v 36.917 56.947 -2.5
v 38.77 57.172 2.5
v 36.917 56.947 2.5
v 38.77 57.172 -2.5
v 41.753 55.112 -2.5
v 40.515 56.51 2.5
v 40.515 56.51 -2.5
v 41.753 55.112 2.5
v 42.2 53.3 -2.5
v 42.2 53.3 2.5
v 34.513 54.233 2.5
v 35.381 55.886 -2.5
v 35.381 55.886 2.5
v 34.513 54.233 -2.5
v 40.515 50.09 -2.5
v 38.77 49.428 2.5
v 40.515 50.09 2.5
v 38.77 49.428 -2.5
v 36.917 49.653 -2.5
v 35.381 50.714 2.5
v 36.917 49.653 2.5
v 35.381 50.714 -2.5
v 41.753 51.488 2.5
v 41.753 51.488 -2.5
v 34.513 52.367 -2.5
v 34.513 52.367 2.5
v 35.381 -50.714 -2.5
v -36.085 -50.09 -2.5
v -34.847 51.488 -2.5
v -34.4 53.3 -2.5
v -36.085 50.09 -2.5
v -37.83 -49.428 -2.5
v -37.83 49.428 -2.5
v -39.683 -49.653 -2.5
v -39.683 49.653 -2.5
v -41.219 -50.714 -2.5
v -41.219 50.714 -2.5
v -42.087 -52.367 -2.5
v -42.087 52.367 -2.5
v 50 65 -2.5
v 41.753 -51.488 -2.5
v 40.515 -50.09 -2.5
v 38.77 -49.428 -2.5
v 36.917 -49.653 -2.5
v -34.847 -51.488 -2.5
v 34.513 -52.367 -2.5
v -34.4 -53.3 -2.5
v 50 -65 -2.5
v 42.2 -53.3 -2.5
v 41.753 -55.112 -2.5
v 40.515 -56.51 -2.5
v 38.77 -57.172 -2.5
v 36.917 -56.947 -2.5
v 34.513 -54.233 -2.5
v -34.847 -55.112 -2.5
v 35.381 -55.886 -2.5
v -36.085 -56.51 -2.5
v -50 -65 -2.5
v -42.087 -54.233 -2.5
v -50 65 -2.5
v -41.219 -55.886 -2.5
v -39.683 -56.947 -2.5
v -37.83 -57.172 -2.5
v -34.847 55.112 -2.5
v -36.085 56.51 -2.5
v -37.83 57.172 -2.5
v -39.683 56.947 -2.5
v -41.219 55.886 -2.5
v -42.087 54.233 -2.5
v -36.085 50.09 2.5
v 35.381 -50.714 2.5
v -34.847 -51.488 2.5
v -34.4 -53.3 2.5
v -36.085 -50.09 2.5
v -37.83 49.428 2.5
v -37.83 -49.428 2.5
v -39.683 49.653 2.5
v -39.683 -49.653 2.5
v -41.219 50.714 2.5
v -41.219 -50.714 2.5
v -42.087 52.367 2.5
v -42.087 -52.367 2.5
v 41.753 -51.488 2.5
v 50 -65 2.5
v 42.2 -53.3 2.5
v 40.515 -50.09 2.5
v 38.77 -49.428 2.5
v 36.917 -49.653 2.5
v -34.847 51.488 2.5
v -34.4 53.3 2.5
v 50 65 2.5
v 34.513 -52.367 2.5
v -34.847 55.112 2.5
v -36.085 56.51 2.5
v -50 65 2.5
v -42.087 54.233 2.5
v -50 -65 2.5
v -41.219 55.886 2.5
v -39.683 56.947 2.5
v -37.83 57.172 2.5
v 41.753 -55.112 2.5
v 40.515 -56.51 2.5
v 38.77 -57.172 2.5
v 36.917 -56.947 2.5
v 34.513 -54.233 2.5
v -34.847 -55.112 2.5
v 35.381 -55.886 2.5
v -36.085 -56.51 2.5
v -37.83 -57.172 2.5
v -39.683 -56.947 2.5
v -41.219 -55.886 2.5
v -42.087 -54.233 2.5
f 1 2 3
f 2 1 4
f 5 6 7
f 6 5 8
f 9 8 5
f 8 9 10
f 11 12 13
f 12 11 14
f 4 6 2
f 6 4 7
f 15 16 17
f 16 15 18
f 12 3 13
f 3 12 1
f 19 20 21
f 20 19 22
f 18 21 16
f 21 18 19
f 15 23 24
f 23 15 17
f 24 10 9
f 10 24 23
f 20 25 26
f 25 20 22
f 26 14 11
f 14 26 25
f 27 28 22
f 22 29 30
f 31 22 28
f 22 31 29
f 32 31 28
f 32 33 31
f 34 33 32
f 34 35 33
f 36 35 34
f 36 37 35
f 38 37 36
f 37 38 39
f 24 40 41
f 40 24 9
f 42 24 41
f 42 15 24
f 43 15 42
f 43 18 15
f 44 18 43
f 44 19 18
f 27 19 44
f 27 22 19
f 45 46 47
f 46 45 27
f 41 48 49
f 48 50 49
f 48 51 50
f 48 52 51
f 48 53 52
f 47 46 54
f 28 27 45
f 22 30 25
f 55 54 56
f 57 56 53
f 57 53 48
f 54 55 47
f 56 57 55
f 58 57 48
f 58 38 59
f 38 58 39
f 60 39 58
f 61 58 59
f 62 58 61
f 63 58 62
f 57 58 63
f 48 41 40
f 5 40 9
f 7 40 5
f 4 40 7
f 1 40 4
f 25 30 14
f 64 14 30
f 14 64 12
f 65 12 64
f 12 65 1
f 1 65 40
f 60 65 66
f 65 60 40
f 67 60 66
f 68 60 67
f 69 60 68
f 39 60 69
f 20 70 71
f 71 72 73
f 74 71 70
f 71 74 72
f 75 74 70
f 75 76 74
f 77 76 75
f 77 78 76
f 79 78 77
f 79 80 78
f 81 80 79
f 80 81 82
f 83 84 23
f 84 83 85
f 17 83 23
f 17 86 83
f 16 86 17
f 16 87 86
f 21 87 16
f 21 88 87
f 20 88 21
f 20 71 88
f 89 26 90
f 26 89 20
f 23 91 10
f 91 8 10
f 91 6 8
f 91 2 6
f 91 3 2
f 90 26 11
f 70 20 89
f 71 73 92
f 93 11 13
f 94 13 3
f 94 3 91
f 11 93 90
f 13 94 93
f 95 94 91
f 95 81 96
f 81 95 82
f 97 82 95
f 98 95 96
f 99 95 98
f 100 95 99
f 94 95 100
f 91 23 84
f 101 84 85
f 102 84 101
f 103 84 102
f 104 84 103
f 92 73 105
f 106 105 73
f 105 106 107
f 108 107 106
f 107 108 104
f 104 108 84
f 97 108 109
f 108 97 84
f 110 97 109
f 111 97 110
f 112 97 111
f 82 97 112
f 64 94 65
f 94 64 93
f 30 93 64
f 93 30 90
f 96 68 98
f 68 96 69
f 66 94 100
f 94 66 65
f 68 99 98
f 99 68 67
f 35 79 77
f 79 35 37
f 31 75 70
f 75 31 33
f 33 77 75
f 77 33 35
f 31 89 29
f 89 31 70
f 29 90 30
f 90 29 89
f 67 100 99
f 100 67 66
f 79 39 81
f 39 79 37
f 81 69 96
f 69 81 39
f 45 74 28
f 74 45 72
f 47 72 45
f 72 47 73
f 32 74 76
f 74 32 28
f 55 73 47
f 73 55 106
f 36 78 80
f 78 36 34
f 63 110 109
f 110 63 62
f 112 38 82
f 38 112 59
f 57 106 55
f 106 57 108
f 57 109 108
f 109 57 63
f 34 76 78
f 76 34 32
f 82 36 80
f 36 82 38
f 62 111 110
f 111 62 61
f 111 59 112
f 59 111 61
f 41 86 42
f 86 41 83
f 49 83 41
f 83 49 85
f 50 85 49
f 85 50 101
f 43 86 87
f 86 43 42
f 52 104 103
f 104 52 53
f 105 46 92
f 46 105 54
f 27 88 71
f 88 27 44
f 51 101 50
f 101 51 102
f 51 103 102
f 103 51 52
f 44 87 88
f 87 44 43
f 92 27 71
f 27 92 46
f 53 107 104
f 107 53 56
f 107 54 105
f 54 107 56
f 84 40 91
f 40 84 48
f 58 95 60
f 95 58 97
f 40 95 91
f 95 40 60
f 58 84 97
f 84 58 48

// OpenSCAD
// Generated by SolidPython 1.1.3 on 2022-11-23 19:51:19


difference() {
	cube(center = true, size = [100, 130.0000000000, 5]);
	union() {
		translate(v = [38.3000000000, 53.3000000000]) {
			cylinder(center = true, h = 5, r = 3.9000000000);
		}
		translate(v = [-38.3000000000, 53.3000000000]) {
			cylinder(center = true, h = 5, r = 3.9000000000);
		}
		translate(v = [-38.3000000000, -53.3000000000]) {
			cylinder(center = true, h = 5, r = 3.9000000000);
		}
		translate(v = [38.3000000000, -53.3000000000]) {
			cylinder(center = true, h = 5, r = 3.9000000000);
		}
	}
}
/***********************************************
*********      SolidPython code:      **********
************************************************
 
import solid
import pudb
from solid.utils import *
import viewscad
import subprocess
import os
import os.path as osp
import math
r = viewscad.Renderer(width=800, height=800)
def debug(model,f_name,path="/home/ts/code/projects/mfd/designs/debug"):
    solid.scad_render_to_file(model,osp.join(path,f_name)+".scad")
#generate position list of wells using offset from center
wells_pos_from_center_4 = lambda offset: [[-offset,offset],
                                        [offset, offset],
                                        [-offset, -offset],
                                        [offset, -offset]]
#wells_pos_from_center_2 = lambda offset: [[0,offset],
#                                        [0, -offset]]
wells_pos_from_center_2 = lambda offset: [[offset,0],
                                        [-offset,0]]

def wells_top_bottom(radius,height=None, positions = None, dxf = False):
    if positions is None:
        offset = radius+radius/2.0
        positions = wells_pos_from_center_2(offset)
    if dxf or (height is None):
        height = 0
    wells = []
    for position in positions:
        #make circle if making dxf
        if dxf:
            well_shape = solid.circle(r=radius, segments=64)
            well_shape = solid.translate([position[0],position[1]])(well_shape)
        #if stl make cylinder
        else:
            well_shape = solid.cylinder(r=radius, h=height, segments=64, center = True)
            well_shape = solid.translate([position[0],position[1],height/2.0])(well_shape)
        wells.append(well_shape)
    return  union()(*wells)

#place wells in four corners 
def four_corner(radius,height=None, positions = None, dxf = False):
    #if well pos not specified set
    #to equally spaced by half radius
    if positions is None:
        offset = radius+radius/2.0
        positions = wells_pos_from_center_4(offset)
    if dxf or (height is None):
        height = 0
    #make wells at positions with specified radius and height
    wells = []
    for position in positions:
        #make circle if making dxf
        if dxf:
            well_shape = solid.circle(r=radius, segments=64)
            well_shape = solid.translate([position[0],position[1]])(well_shape)
        #if stl make cylinder
        else:
            well_shape = solid.cylinder(r=radius, h=height, segments=64, center = True)
            well_shape = solid.translate([position[0],position[1],height/2.0])(well_shape)
        wells.append(well_shape)
    return  union()(*wells)

#generate channels 
def make_channels(length,width,height=0,num_chans=1,max_chans=None,spacing=None, dxf = False,
                  rotate_channels=False):
    if dxf or (height is None):
        height = 0
    #if channel gap not defined, is equal to
    if spacing is None: spacing = width
    #calculate number of channels if fitting max num within given width
    if not max_chans is None:
        import math
        num_chans = math.floor((max_chans-spacing)/(width+spacing))
    #get total width of channel section  
    total_width = (width*num_chans)+(spacing*(num_chans-1))

    #make template channel
    #if rotate_channels: width, length = length, width
    if dxf:
        channel_t = solid.square([length,width],center = True)
    else:
        channel_t = solid.cube([length,width,height], center = True)

    #if number channels is even, offset the first channel to center its gap
    if num_chans % 2 == 0: centering = -(width/2.0+spacing/2.0)
    else: centering = 0
    #move template channel up to align bottom at z = 0 
    #and offset center if necessary
    if dxf:
        channel_t = solid.translate([0,centering])(channel_t)
    else:
        channel_t = solid.translate([0,centering,height/2.0])(channel_t)

    #if rotate_channels: length,width = width,length
    #start making the channels
    channels = []
    for i in range(num_chans):
        #if i=0 there is no translation
        #if i=1, we make the first channel adjacent to second
        direction = i

        #if i>=1, we add channels alternating left and right
        if i >= 1:
            direction = -(i/2.0)
            if i % 2 == 1: direction = (-direction)+0.5
                
        #make channel at right position and add it to channel list
        translation_coords = [0,direction*(width+spacing)]
        #if rotate_channels: translation_coords = [direction*(width+spacing),0]
        if dxf:
            channel = solid.translate(translation_coords)(channel_t)
        else:
            channel = solid.translate([*translation_coords,0])(channel_t)
        channels.append(channel)
    
    #group all channels as one object
    channels = union()(*channels)
    #compute the x,y,z dimensions in order to pass as arguments 
    #for construction of other parts of device (such as the chambers)
    measurements = {'x':(length/2.0,-length/2.0),
                    'y':(total_width/2.0,-total_width/2.0)}
    if not dxf:
        measurements['z'] = (height,0)
    if rotate_channels:
        channels = solid.rotate(90)(channels)
        measurements['x'],measurements['y']=measurements['y'],measurements['x']
    return channels,measurements

def make_chambers(msrs,height=None,extra=0,len_until=None,width=None, dxf = False):
    #computes x,y,z length
    total = lambda x : abs(x[0]) + abs(x[1])
    
    #if specific height if specified
    #otherwise use same height as channels
    if dxf:
        pass
    elif not height is None:
        msrs['z'] = (height,0)
    else:
        msrs['z'] = (0,0)
        
    #make copy of measurements from channels to modify chamber dimensions 
    #and add length to chambers as specified
    chamber_dims = msrs.copy()
    #calculate length of chamber to reach specified offset
    if not len_until is None:
        chamber_len = len_until-(msrs['x'][0])
    #or add specified length to channel length (if not specified, adds 0)
    else:
        chamber_len = msrs['x'][0]+extra
    #set the chamber length based 
    chamber_dims['x'] = (chamber_len/2.0,-(chamber_len/2.0))
    #compute final dimensions of chamber
    if not width is None:
        chamber_dims['y'] = (width/2.0,-width/2.0)
    chamber_dims = [total(size) for size in chamber_dims.values()]
        
    #calculate chamber translation offset to place adjacent to channels
    chamber_trslt = msrs['x'][0]+(chamber_len/2.0)
    #compute chamber translation coordinates to align with channels
    #x = 1 moves chamber above channels
    #x = -1 moves chamber below channels
    if dxf:
        trslt = lambda x : [x*(chamber_trslt),0]
    else:
        trslt = lambda x : [x*(chamber_trslt),0,msrs['z'][0]/2.0]
    
    #function to make chamber at top or at bottom 
    if dxf:
        move = lambda x : solid.translate(trslt(x))(solid.square(chamber_dims, center = True) )
    else:
        move = lambda x : solid.translate(trslt(x))(solid.cube(chamber_dims,center = True))
    #make top and bottom chambers and return them as grouped
    top = move(1)
    bottom = move(-1)
    #chambers=solid.rotate(90)(solid.union()(top,bottom))
    chambers=(solid.union()(top,bottom))

    return chambers

#create alignment features 
def alignment_features(unit,dims,grid_size, mask_size = None, alignment = "hollow", units_from_center = (2.5,2.5), corner_len=None):
    width = grid_size[0]*dims[0]
    length = grid_size[1]*dims[1]
    if mask_size is None and corner_len is None:
        corner_len = (dims[0] + dims[1]) /2 / 8
    corner = lambda thickness_div : solid.union()( solid.square([corner_len,corner_len/thickness_div],center=False), solid.square([corner_len/thickness_div,corner_len],center=False) )
    
    def make_full(thickness_div):
        thickness = corner_len/thickness_div
        tr = solid.translate([0, 0, 0 ])(solid.rotate(180)(corner(thickness_div)))
        tr = solid.translate([thickness/2,thickness/2,0])(tr)
        bl = solid.translate([0, 0, 0 ])(solid.rotate(0)(corner(thickness_div)))
        bl = solid.translate([-thickness/2,-thickness/2,0])(bl)
        return solid.union()(tr,bl)
    
    def make_hollow(thickness_div):
        thickness = corner_len/(thickness_div/2)
        inner = make_full(thickness_div)
        outer = make_full(thickness_div/2)
        hollow = outer - inner 
        return hollow
    
    center = (width /2 , length/2)
    mask_pos = lambda x,y : (center[0] + x*(float(units_from_center[0])*dims[0]), center[1] + y*(float(units_from_center[1])*dims[1]))
    positions = []
    positions.append(mask_pos(1,0))
    positions.append(mask_pos(0,1))
    positions.append(mask_pos(-1,0))
    positions.append(mask_pos(0,-1))
    make_mask = lambda mtype : make_hollow(8) if mtype == "hollow" else make_full(8)
    masks = [ solid.translate([*position,0])(make_mask(alignment)) for position in positions]
    
    solid.scad_render_to_file(solid.union()(*masks),"./designs/open_chamber/masks.scad")
    #return unit - solid.union()(*masks)
    return solid.union()(*masks,unit)

def create_outline(thickness, array, dims, grid_size,):
    width = grid_size[0]*dims[0] + thickness *2
    length = grid_size[1]*dims[1] + thickness *2
    outer = solid.translate([-thickness, -thickness,0])(solid.square([width, length]))
    return outer-array

def create_wall(wall_thickness, outline_thickness, dims, grid_size, wall_height = 2000, dxf = False):
    inner_width = grid_size[0]*dims[0] + outline_thickness *2
    inner_length = grid_size[1]*dims[1] + outline_thickness *2
    outer_width = inner_width + wall_thickness * 2
    outer_length = inner_length + wall_thickness * 2
    outer_pos_x = -outline_thickness-wall_thickness
    outer_pos_y = -outline_thickness-wall_thickness
    inner_pos_x = -outline_thickness
    inner_pos_y = -outline_thickness
    if dxf:
        inner_wall = solid.translate([inner_pos_x,
                                      inner_pos_y,
                                      0])(solid.square([inner_width, inner_length]))
        outer_wall = solid.translate([outer_pos_x,
                                      outer_pos_y,
                                      0])(solid.square([outer_width, outer_length]))

        return outer_wall-inner_wall
    else:
        inner_wall = solid.translate([inner_pos_x,
                                      inner_pos_y,
                                      0])(solid.cube([inner_width, inner_length,wall_height]))
        outer_wall = solid.translate([outer_pos_x,
                                      outer_pos_y,
                                      0])(solid.cube([outer_width, outer_length,wall_height]))

        return outer_wall-inner_wall, {'wall_height': wall_height,
                                       'wall_thickness': wall_thickness,
                                       'inner_width':inner_width,
                                       'inner_length': inner_length,
                                       'outer_width': outer_width,
                                       'outer_length': outer_length,
                                       'outer_pos_x' : outer_pos_x,
                                       'outer_pos_y' : outer_pos_y,
                                       'inner_pos_x' : inner_pos_x,
                                       'inner_pos_y' : inner_pos_y}

def create_thicker_wall(wall_thickness, outer_wall_offset, wall_dims, dims, grid_size, height_start = .2, height_end=2, dxf = False):
    addon_wall,thicker_wall_dims = create_wall(wall_thickness, outer_wall_offset, dims, grid_size, wall_height=height_end-height_start, dxf = False)
    addon_wall = solid.translate([0,0,height_start])(addon_wall)

    thicker_wall_dims['wall_height'] = height_end
    thicker_wall_dims['wall_thickness'] = wall_dims['wall_thickness'] + wall_thickness
    return addon_wall, thicker_wall_dims
 
def add_lock_to_wall(wall,wall_dims,y_offset = 0,cut_ratio=0.7,L_length=3, gap_ratio=0.05, axis="x",width_ratio=1/2):
    # Makes L shape
    def make_L(max_length,length_thickness,max_width,width_thickness,height,y_offset):
        length = solid.cube([max_length,length_thickness,height])
        width = solid.cube([width_thickness,max_width,height])
        width = solid.translate([max_length-(width_thickness),0,0])(width)
        L = solid.union()(width,length)
        debug(L,"L")
        if axis == "x":
            L = solid.rotate(-90)(L)
            L = solid.translate([0,max_length,0])(L)
        else:
            L = solid.rotate(-180)(L)
            L = solid.translate([max_length,max_width,0])(L)
        return solid.translate([0,0,y_offset])(L)
    
    lock_length = L_length
    lock_width = wall_dims['wall_thickness']*width_ratio
    lock_length_thickness = lock_width/2
    lock_width_thickness = lock_width/2
    L_lock = make_L(lock_length,lock_length_thickness,lock_width,lock_width_thickness, wall_dims['wall_height']-y_offset, y_offset)
    
    margin_space = lock_length - lock_length*(1-gap_ratio)
    key_length = lock_length-margin_space
    key_length_thickness = lock_length_thickness-(margin_space*2)
    key_width = lock_width-(margin_space*2)
    key_width_thickness = lock_width_thickness-(margin_space*2)
    L_key = make_L(key_length,key_length_thickness,key_width,key_width_thickness, wall_dims['wall_height']-y_offset, y_offset)
    L_key = solid.translate([margin_space,margin_space,0])(L_key)
    L = solid.union()(L_lock,L_key)
    debug(L,"L")
    
    #Make cube to be used as negative to split frame in a half
    #Can choose if making left or right negative, specify ratio of split
    def make_negative(right,cut_ratio):
        if axis == "x":
            if right:
                length = wall_dims['outer_length']*(1-cut_ratio)
                pos_x = wall_dims['outer_pos_x']+(wall_dims['outer_length']*cut_ratio)
            else:
                length = wall_dims['outer_length']*(cut_ratio)
                pos_x = wall_dims['outer_pos_x'] 
            negative = solid.cube([wall_dims['outer_width'],length, wall_dims['wall_height']])
            negative = solid.translate([wall_dims['outer_pos_y'],pos_x,0])(negative)
        else:
            if right:
                length = wall_dims['outer_width']*(1-cut_ratio)
                pos_x = wall_dims['outer_pos_y']+(wall_dims['outer_width']*cut_ratio)
            else:
                length = wall_dims['outer_width']*(cut_ratio)
                pos_x = wall_dims['outer_pos_y'] 
            negative = solid.cube([length,wall_dims['outer_length'], wall_dims['wall_height']])
            negative = solid.translate([pos_x,wall_dims['outer_pos_x'],0])(negative)
        return negative, pos_x, length 
                      
    #Make negatives
    negative_right, right_half_pos_x, right_half_length = make_negative(True,cut_ratio)
    negative_left, left_half_pos_x, right_half_length = make_negative(False,cut_ratio)
    #Make halves
    left_half = solid.difference()(wall,negative_right)
    right_half = solid.difference()(wall,negative_left)
    def place_L(L, L_length,L_width):
        #Place L on top wall       
        offset_to_center = (wall_dims['wall_thickness']-L_width)/2
        if axis == "x":
            y_pos_top = (wall_dims['outer_pos_y'] +
                    wall_dims['outer_width'] - 
                    L_width - offset_to_center)
            top_L = solid.translate([y_pos_top,
                                     right_half_pos_x-(L_length),
                                     0])(L)
            #Place L on bottom wall       
            y_pos_bottom = wall_dims['outer_pos_y']+offset_to_center
            bottom_L = solid.translate([y_pos_bottom,
                                        right_half_pos_x-L_length,
                                        0])(L)
        else:
            y_pos_top = (wall_dims['outer_pos_x'] +
                    wall_dims['outer_length'] -
                    (L_width+offset_to_center))
            top_L = solid.translate([right_half_pos_x-L_length,
                                     y_pos_top,
                                     0])(L)
            #Place L on bottom wall       
            y_pos_bottom = wall_dims['outer_pos_y']+offset_to_center
            bottom_L = solid.translate([right_half_pos_x-L_length,
                                        y_pos_bottom,
                                        0])(L)
        return bottom_L, top_L
    #Make complimentary L pieces through union and differences
    #Make Lock
    bottom_L_lock, top_L_lock = place_L(L_lock,L_length,lock_width)
    left_half = solid.difference()(left_half,bottom_L_lock)
    left_half = solid.difference()(left_half,top_L_lock)
    #Make Key
    bottom_L_key, top_L_key = place_L(L_key,L_length,lock_width)
    right_half = solid.union()(right_half,bottom_L_key)
    right_half = solid.union()(right_half,top_L_key)
    return left_half, right_half


#build a row x col grid of containment units
def make_unit_array(unit,dims,grid_size, dxf = False, alignment = None, mask_size = None,
                    units_from_center = None,alignment_offset=None, alignment_mark_size=1):
    units = []
    for col in range(grid_size[1]):
        for row in range(grid_size[0]):
            if dxf:
                units.append(solid.translate([row*dims[0],col*dims[1]])(unit))
            else:
                units.append(solid.translate([row*dims[0],col*dims[1],dims[2]/2.0])(unit))
    array = solid.union()(*units)
    if (not alignment is None) and dxf:
        if not alignment_offset is None:
            array = solid.translate([alignment_offset[0],alignment_offset[1]])(array)
        array = alignment_features(array,dims, grid_size, alignment = alignment, mask_size = None, units_from_center = units_from_center,corner_len=alignment_mark_size)
        if not alignment_offset is None:
            array = solid.translate([-alignment_offset[0],-alignment_offset[1]])(array)
    return array


def make_taylor(wells_pos = wells_pos_from_center_4(2.25), well_rad = 1.5 ,
                well_height = 2, chan_w = 0.01, chan_l = 1, chan_h = 0.010 ,
                chan_gap = 0.040, max_chans = None,num_chans=100, chamber_height  = 0.100,
                columns = 1, rows = 1, chamber_len_until=2.25, add_channels = True, add_wells = True, 
                add_chambers = True, save_path = "./", alignment = None, units_from_center = 2,
                mask_size = None, render_stl = False, outline_thickness = 0.050, dxf = True,
                wall_height = 15, wall_thickness = 0.95, casing_x=9, casing_y=9, casing_z=0,rotate_units=0):

    dims = [casing_x, casing_y, casing_z]
    wells = four_corner(well_rad,well_height, dxf = dxf, positions = wells_pos)
    debug(wells,"wells")
    channels, msrs = make_channels(chan_l,chan_w,chan_h,dxf=dxf, spacing = chan_gap, max_chans=max_chans,num_chans=num_chans)
    debug(channels,"channels")
    chambers = make_chambers(msrs,dxf = dxf, height=chamber_height,len_until=chamber_len_until)
    debug(chambers,"chambers")

    #add together and render
    device_parts = []
    if add_channels:
        device_parts.append(channels)
    if add_wells:
        device_parts.append(wells)
    if add_chambers:
        device_parts.append(chambers)
    device=union()(*device_parts)
    device = rotate(rotate_units)(device)

    device=solid.translate([dims[0]/2.0,dims[1]/2.0,0])(device)
    channels = rotate(rotate_units)(channels)
    channels=solid.translate([dims[0]/2,dims[1]/2,0])(channels)
    chambers_wells = union()(wells,chambers)
    chambers_wells = rotate(rotate_units)(chambers_wells)
    chambers_wells=solid.translate([dims[0]/2,dims[1]/2,0])(chambers_wells)

    file_name = str(rows)+'x'+str(columns)+'_units_'
    grid_size = [rows,columns]

    if alignment:
        alignment="full"
    device = make_unit_array(device,dims,grid_size, dxf=dxf, alignment = alignment,
                                 units_from_center = units_from_center)
    channels = make_unit_array(channels,dims,grid_size, dxf=dxf, alignment = alignment,
                                 units_from_center = units_from_center)
    if alignment=="full":
        alignment="hollow"

    chambers_wells = make_unit_array(chambers_wells,dims,grid_size, dxf=dxf, alignment = alignment,
                                 units_from_center =units_from_center)

    def save_model(model,prefix):
        model_fname = os.path.abspath(save_path+prefix+"_"+file_name+".scad")
        solid.scad_render_to_file(model,model_fname)
        return model_fname

    wells_fname = save_model(wells,"wells")
    channels_fname = save_model(channels,"channels")
    device_fname = save_model(device,"device")
    chambers_wells_fname = save_model(chambers_wells,"chambers_wells")
    return (chambers_wells,chambers_wells_fname), (channels,channels_fname), (device,device_fname)

def make_device(design='open',rows=8,columns=6,wells_pos = 4.5, well_rad=3.2,well_height=0.1,
                chan_l=1,chan_w=0.01,chan_h=0.01,chan_gap=0.015,num_chans=101,dxf=True,save_path="./designs/open_chamber/",
                casing_x=9.0,casing_y=18.0,casing_z=0,rotate_units=90,units_from_center=(3,1),chamber_len_until=4.5,
                chamber_width=None,alignment=True, add_wells=True, add_channels=True,add_chambers=True):

    dims = [casing_x, casing_y, casing_z]
    if design == "open":
        wells_pos=wells_pos_from_center_2(wells_pos)
        wells = wells_top_bottom(well_rad,height=well_height, dxf = dxf, positions = wells_pos)
    elif design == "closed":
        wells_pos=wells_pos_from_center_4(wells_pos)
        wells = four_corner(well_rad,well_height, dxf = dxf, positions = wells_pos)
    else:
        print(design+" is not a valid design.\n Choose valid design: 'open' or 'closed'")
        exit()
    wells = rotate(rotate_units)(wells)
    wells=solid.translate([dims[0]/2,dims[1]/2,0])(wells)



    channels, msrs = make_channels(chan_l,chan_w,chan_h,dxf=dxf, spacing = chan_gap, num_chans=num_chans,rotate_channels=False)
    channels = rotate(rotate_units)(channels)
    channels=solid.translate([dims[0]/2,dims[1]/2,0])(channels)

    chambers=make_chambers(msrs,height=None,extra=0,len_until=chamber_len_until, width=chamber_width,dxf = dxf)
    chambers = rotate(rotate_units)(chambers)
    chambers=solid.translate([dims[0]/2,dims[1]/2,0])(chambers)

    device_parts = []
    if add_channels:
        device_parts.append(channels)
    if add_wells:
        device_parts.append(wells)
    if add_chambers:
        device_parts.append(chambers)
    device = union()(*device_parts)
    #device = rotate(rotate_units)(device)
    #device=solid.translate([dims[0]/2.0,dims[1]/2.0,0])(device)

    chambers_wells = []
    if add_chambers:
        chambers_wells.append(chambers)
    if add_wells:
        chambers_wells.append(wells)
    chambers_wells = union()(*chambers_wells)
    #chambers_wells = union()(wells,chambers)
    #chambers_wells = rotate(rotate_units)(chambers_wells)
    #chambers_wells=solid.translate([dims[0]/2,dims[1]/2,0])(chambers_wells)

    file_name = str(rows)+'x'+str(columns)+'_units_'

    grid_size = [rows,columns]
    if alignment:
        alignment="full"
    device = make_unit_array(device,dims,grid_size, dxf=dxf, alignment = alignment,
                                 units_from_center = units_from_center)
    channels = make_unit_array(channels,dims,grid_size, dxf=dxf, alignment = alignment,
                                 units_from_center = units_from_center)
    if alignment=="full":
        alignment="hollow"

    chambers_wells = make_unit_array(chambers_wells,dims,grid_size, dxf=dxf, alignment = alignment,
                                 units_from_center =units_from_center)

    def save_model(model,prefix):
        model_fname = os.path.abspath(save_path+prefix+"_"+file_name+".scad")
        solid.scad_render_to_file(model,model_fname)
        return model_fname

    wells_fname = save_model(wells,"wells")
    channels_fname = save_model(channels,"channels")
    device_fname = save_model(device,"device")
    chambers_wells_fname = save_model(chambers_wells,"chambers_wells")
    return (chambers_wells,chambers_wells_fname), (channels,channels_fname), (device,device_fname)


def make_open_chamber(rows=8,columns=6,wells_pos = wells_pos_from_center_2(4.5), well_rad=3.2,well_height=0.1,
                      chan_l=1,chan_w=0.01,chan_h=0.01,chan_gap=0.015,num_chans=101,dxf=True,save_path="./designs/open_chamber/",
                      casing_x=9.0,casing_y=18.0,casing_z=0,rotate_units=90,units_from_center=(3,1),chamber_len_until=4.5,
                      chamber_width=None,alignment=True, add_wells=True, add_channels=True,add_chambers=True):

    dims = [casing_x, casing_y, casing_z]
    wells = wells_top_bottom(well_rad,height=well_height, dxf = dxf, positions = wells_pos)
    channels, msrs = make_channels(chan_l,chan_w,chan_h,dxf=dxf, spacing = chan_gap, num_chans=num_chans,rotate_channels=False)
    chambers=make_chambers(msrs,height=None,extra=0,len_until=chamber_len_until, width=chamber_width,dxf = dxf)
    debug(chambers,"chambers")
    device_parts = []
    if add_channels:
        device_parts.append(channels)
    if add_wells:
        device_parts.append(wells)
    if add_chambers:
        device_parts.append(chambers)
    device = union()(*device_parts)
    device = rotate(rotate_units)(device)
    device=solid.translate([dims[0]/2.0,dims[1]/2.0,0])(device)
    channels = rotate(rotate_units)(channels)
    channels=solid.translate([dims[0]/2,dims[1]/2,0])(channels)
    chambers_wells = union()(wells,chambers)
    chambers_wells = rotate(rotate_units)(chambers_wells)
    chambers_wells=solid.translate([dims[0]/2,dims[1]/2,0])(chambers_wells)

    file_name = str(rows)+'x'+str(columns)+'_units_'

    grid_size = [rows,columns]
    if alignment:
        alignment="full"
    device = make_unit_array(device,dims,grid_size, dxf=dxf, alignment = alignment,
                                 units_from_center = units_from_center)
    channels = make_unit_array(channels,dims,grid_size, dxf=dxf, alignment = alignment,
                                 units_from_center = units_from_center)
    if alignment=="full":
        alignment="hollow"

    chambers_wells = make_unit_array(chambers_wells,dims,grid_size, dxf=dxf, alignment = alignment,
                                 units_from_center =units_from_center)

    def save_model(model,prefix):
        model_fname = os.path.abspath(save_path+prefix+"_"+file_name+".scad")
        solid.scad_render_to_file(model,model_fname)
        return model_fname

    wells_fname = save_model(wells,"wells")
    channels_fname = save_model(channels,"channels")
    device_fname = save_model(device,"device")
    chambers_wells_fname = save_model(chambers_wells,"chambers_wells")
    return (chambers_wells,chambers_wells_fname), (channels,channels_fname), (device,device_fname)

def to_dxf(scad_path):
    dxf_path = scad_path.replace(".scad",".dxf")
    subprocess.call(["openscad", "-o", dxf_path, scad_path])
    import ezdxf
    temp_dxf = ezdxf.readfile(dxf_path)
    temp_dxf.saveas(dxf_path)

#def make_walls(diameter,thickness,grid_size,dims,height=20,segments=256,make_inner=True):
#    wafer_wall_out = solid.cylinder(r=diameter/2,h=height, segments=segments)
#    wafer_wall_in = solid.cylinder(r=(diameter/2-thickness),h=height, segments=segments)
#    wafer_wall = solid.difference()(wafer_wall_out,wafer_wall_in)
#    wafer_wall = solid.translate([grid_size[1]*dims[1]/2.0,grid_size[0]*dims[0]/2.0])(wafer_wall)
#
#    vertical_wall_length = grid_size[1]*dims[1]
#    horizontal_wall_length = grid_size[0]*dims[0]
#    vertical_wall = solid.cube([vertical_wall_length,thickness,height],center = True)
#    vertical_wall = solid.translate([vertical_wall_length/2,0,height/2])(vertical_wall)
#    horizontal_wall = solid.cube([thickness,horizontal_wall_length,height],center = True)
#    horizontal_wall = solid.translate([0,vertical_wall_length/2,height/2])(horizontal_wall)
#    walls = []
#    walls.append(horizontal_wall)
#    walls.append(vertical_wall)
#    for col in range(grid_size[1]):
#        if col == grid_size[1]-1: 
#            walls.append(solid.translate([0,(col+1)*dims[1]])(vertical_wall))
#        elif col > 0 and col < grid_size[1]-1 and make_inner==True:
#            walls.append(solid.translate([0,(col+1)*dims[1]])(vertical_wall))
#    for row in range(grid_size[0]):
#        if row == grid_size[0]-1: 
#            walls.append(solid.translate([(row+1)*dims[0],0])(horizontal_wall))
#        elif row > 0 and row < grid_size[0]-1 and make_inner==True:
#            walls.append(solid.translate([(row+1)*dims[0],0])(horizontal_wall))
#    walls = union()(*walls)
#    wafer_walls = union()(walls,wafer_wall)
#    return walls,wafer_wall,wafer_walls

def make_walls(diameter,thickness,grid_size,dims,height=20,segments=256,make_inner=True,padx=0,pady=0):
    wafer_wall_out = solid.cylinder(r=diameter/2,h=height, segments=segments)
    wafer_wall_in = solid.cylinder(r=(diameter/2-thickness),h=height, segments=segments)
    wafer_wall = solid.difference()(wafer_wall_out,wafer_wall_in)
    wafer_wall = solid.translate([grid_size[1]*dims[1]/2.0,grid_size[0]*dims[0]/2.0])(wafer_wall)

    vertical_wall_length = grid_size[0]*dims[0]+padx
    horizontal_wall_length = grid_size[1]*dims[1]+pady
    vertical_wall = solid.cube([vertical_wall_length,thickness,height],center = True)
    vertical_wall = solid.translate([vertical_wall_length/2-pady/2,-padx/2,height/2])(vertical_wall)
    horizontal_wall = solid.cube([thickness,horizontal_wall_length,height],center = True)
    horizontal_wall = solid.translate([-pady/2,horizontal_wall_length/2-padx/2,height/2])(horizontal_wall)
    walls = []
    walls.append(horizontal_wall)
    walls.append(vertical_wall)
    for col in range(grid_size[1]):
        if col == grid_size[1]-1: 
            walls.append(solid.translate([0,(col+1)*dims[1]+pady])(vertical_wall))
        elif col > 0 and col < grid_size[1]-1 and make_inner==True:
            walls.append(solid.translate([0,(col+1)*dims[1]])(vertical_wall))
    for row in range(grid_size[0]):
        if row == grid_size[0]-1: 
            walls.append(solid.translate([(row+1)*dims[0]+padx,0])(horizontal_wall))
        elif row > 0 and row < grid_size[0]-1 and make_inner==True:
            walls.append(solid.translate([(row+1)*dims[0],0])(horizontal_wall))
    walls = union()(*walls)
    wafer_walls = union()(walls,wafer_wall)
    return walls,wafer_wall,wafer_walls

def save_model(model,base_path,base_name,dxf=True):
    if not os.path.exists(base_path):
        os.makedirs(base_path)
    dxf_path=osp.join(base_path,base_name+".scad")
    solid.scad_render_to_file(model,osp.join(dxf_path))
    if dxf:
        to_dxf(dxf_path)

def make_wafer(diameter,flat_len,thickness):
    wafer = solid.cylinder(r1=diameter/2,r2=diameter/2,h=thickness,segments=512,)()
    x_start_flat=(flat_len/2)
    y_start_flat = math.sqrt(((diameter/2)**2) - (x_start_flat**2) )
    height_delete_flat=diameter/2-y_start_flat
    flat_delete = solid.cube([flat_len,height_delete_flat,thickness],center=False)()
    flat_delete = solid.translate([-flat_len/2,y_start_flat,0])(flat_delete)
    wafer = solid.difference()(wafer,flat_delete)
    wafer = solid.rotate(90)(wafer)
    return wafer

def add_wafer_to_mask(wafer_size,flat_len,mask,grid_size,dims,wafer_line_thickness=0.1,outer_mask_thickness=5,alignment_offset=None):
    def make_wafer_mask(wafer_size,flat_len):
        wafer_mask = make_wafer(wafer_size,flat_len,1)
        wafer_mask = solid.projection()(wafer_mask)
        wafer_mask = solid.translate([grid_size[0]*dims[0]/2.0,grid_size[1]*dims[1]/2.0])(wafer_mask)
        if not alignment_offset is None:
            wafer_mask = solid.translate([-alignment_offset[0],-alignment_offset[1]])(wafer_mask)
        return wafer_mask

    inner_wafer_line_mask = make_wafer_mask(wafer_size-wafer_line_thickness/2,flat_len)
    outer_wafer_line_mask = make_wafer_mask(wafer_size+wafer_line_thickness/2,flat_len)
    outer_wafer_mask = make_wafer_mask(wafer_size+outer_mask_thickness,flat_len)
    outer_wafer_mask = solid.difference()(outer_wafer_mask,outer_wafer_line_mask)
    wafer_mask = solid.union()(outer_wafer_mask,inner_wafer_line_mask)

    return solid.difference()(wafer_mask,mask)

def make_posts(post_shape,post_height):
    posts = solid.linear_extrude(height=post_height)(post_shape)
    return posts

def make_wafer_empty(diameter,flat_len,thickness,margin,notch_len=20,notch_height=5,oversize=1.01):
    diameter*=oversize
    flat_len*=oversize
    wafer = make_wafer(diameter,flat_len,thickness)
    holder = solid.cylinder(r1=diameter/2+margin,r2=diameter/2+margin,h=thickness,segments=512)()
    holder = solid.difference()(holder,wafer)

    x_start_flat=(flat_len/2)
    y_start_flat = math.sqrt(((diameter/2)**2) - (x_start_flat**2) )
    height_delete_flat=diameter/2-y_start_flat
    notch = solid.cube([notch_len,notch_height,thickness],center=False)()
    notch = solid.translate([-notch_len/2,y_start_flat,0])(notch)
    notch = solid.rotate(90)(notch)
    return solid.difference()(holder,notch)

def wafer_print_calibration(diameter,thickness,height,z_offset):
    circles = []
    radii = []
    radii.append(diameter/2.0*0.8)
    radii.append(diameter/2.0*0.6)
    radii.append(diameter/2.0*0.4)
    radii.append(diameter/2.0*0.2)
    for radius in radii:
        inner = solid.cylinder(r1=radius-(thickness/2.0),r2=radius-(thickness/2.0),h=thickness,segments=512,)()
        outer = solid.cylinder(r1=radius+(thickness/2.0),r2=radius+(thickness/2.0),h=thickness,segments=512,)()
        diff = solid.difference()(outer,inner)
        circles.append(diff)
    circles = solid.union()(*circles)
    circles = solid.translate([0,0,z_offset])(circles)
    return circles






 
 
************************************************/
